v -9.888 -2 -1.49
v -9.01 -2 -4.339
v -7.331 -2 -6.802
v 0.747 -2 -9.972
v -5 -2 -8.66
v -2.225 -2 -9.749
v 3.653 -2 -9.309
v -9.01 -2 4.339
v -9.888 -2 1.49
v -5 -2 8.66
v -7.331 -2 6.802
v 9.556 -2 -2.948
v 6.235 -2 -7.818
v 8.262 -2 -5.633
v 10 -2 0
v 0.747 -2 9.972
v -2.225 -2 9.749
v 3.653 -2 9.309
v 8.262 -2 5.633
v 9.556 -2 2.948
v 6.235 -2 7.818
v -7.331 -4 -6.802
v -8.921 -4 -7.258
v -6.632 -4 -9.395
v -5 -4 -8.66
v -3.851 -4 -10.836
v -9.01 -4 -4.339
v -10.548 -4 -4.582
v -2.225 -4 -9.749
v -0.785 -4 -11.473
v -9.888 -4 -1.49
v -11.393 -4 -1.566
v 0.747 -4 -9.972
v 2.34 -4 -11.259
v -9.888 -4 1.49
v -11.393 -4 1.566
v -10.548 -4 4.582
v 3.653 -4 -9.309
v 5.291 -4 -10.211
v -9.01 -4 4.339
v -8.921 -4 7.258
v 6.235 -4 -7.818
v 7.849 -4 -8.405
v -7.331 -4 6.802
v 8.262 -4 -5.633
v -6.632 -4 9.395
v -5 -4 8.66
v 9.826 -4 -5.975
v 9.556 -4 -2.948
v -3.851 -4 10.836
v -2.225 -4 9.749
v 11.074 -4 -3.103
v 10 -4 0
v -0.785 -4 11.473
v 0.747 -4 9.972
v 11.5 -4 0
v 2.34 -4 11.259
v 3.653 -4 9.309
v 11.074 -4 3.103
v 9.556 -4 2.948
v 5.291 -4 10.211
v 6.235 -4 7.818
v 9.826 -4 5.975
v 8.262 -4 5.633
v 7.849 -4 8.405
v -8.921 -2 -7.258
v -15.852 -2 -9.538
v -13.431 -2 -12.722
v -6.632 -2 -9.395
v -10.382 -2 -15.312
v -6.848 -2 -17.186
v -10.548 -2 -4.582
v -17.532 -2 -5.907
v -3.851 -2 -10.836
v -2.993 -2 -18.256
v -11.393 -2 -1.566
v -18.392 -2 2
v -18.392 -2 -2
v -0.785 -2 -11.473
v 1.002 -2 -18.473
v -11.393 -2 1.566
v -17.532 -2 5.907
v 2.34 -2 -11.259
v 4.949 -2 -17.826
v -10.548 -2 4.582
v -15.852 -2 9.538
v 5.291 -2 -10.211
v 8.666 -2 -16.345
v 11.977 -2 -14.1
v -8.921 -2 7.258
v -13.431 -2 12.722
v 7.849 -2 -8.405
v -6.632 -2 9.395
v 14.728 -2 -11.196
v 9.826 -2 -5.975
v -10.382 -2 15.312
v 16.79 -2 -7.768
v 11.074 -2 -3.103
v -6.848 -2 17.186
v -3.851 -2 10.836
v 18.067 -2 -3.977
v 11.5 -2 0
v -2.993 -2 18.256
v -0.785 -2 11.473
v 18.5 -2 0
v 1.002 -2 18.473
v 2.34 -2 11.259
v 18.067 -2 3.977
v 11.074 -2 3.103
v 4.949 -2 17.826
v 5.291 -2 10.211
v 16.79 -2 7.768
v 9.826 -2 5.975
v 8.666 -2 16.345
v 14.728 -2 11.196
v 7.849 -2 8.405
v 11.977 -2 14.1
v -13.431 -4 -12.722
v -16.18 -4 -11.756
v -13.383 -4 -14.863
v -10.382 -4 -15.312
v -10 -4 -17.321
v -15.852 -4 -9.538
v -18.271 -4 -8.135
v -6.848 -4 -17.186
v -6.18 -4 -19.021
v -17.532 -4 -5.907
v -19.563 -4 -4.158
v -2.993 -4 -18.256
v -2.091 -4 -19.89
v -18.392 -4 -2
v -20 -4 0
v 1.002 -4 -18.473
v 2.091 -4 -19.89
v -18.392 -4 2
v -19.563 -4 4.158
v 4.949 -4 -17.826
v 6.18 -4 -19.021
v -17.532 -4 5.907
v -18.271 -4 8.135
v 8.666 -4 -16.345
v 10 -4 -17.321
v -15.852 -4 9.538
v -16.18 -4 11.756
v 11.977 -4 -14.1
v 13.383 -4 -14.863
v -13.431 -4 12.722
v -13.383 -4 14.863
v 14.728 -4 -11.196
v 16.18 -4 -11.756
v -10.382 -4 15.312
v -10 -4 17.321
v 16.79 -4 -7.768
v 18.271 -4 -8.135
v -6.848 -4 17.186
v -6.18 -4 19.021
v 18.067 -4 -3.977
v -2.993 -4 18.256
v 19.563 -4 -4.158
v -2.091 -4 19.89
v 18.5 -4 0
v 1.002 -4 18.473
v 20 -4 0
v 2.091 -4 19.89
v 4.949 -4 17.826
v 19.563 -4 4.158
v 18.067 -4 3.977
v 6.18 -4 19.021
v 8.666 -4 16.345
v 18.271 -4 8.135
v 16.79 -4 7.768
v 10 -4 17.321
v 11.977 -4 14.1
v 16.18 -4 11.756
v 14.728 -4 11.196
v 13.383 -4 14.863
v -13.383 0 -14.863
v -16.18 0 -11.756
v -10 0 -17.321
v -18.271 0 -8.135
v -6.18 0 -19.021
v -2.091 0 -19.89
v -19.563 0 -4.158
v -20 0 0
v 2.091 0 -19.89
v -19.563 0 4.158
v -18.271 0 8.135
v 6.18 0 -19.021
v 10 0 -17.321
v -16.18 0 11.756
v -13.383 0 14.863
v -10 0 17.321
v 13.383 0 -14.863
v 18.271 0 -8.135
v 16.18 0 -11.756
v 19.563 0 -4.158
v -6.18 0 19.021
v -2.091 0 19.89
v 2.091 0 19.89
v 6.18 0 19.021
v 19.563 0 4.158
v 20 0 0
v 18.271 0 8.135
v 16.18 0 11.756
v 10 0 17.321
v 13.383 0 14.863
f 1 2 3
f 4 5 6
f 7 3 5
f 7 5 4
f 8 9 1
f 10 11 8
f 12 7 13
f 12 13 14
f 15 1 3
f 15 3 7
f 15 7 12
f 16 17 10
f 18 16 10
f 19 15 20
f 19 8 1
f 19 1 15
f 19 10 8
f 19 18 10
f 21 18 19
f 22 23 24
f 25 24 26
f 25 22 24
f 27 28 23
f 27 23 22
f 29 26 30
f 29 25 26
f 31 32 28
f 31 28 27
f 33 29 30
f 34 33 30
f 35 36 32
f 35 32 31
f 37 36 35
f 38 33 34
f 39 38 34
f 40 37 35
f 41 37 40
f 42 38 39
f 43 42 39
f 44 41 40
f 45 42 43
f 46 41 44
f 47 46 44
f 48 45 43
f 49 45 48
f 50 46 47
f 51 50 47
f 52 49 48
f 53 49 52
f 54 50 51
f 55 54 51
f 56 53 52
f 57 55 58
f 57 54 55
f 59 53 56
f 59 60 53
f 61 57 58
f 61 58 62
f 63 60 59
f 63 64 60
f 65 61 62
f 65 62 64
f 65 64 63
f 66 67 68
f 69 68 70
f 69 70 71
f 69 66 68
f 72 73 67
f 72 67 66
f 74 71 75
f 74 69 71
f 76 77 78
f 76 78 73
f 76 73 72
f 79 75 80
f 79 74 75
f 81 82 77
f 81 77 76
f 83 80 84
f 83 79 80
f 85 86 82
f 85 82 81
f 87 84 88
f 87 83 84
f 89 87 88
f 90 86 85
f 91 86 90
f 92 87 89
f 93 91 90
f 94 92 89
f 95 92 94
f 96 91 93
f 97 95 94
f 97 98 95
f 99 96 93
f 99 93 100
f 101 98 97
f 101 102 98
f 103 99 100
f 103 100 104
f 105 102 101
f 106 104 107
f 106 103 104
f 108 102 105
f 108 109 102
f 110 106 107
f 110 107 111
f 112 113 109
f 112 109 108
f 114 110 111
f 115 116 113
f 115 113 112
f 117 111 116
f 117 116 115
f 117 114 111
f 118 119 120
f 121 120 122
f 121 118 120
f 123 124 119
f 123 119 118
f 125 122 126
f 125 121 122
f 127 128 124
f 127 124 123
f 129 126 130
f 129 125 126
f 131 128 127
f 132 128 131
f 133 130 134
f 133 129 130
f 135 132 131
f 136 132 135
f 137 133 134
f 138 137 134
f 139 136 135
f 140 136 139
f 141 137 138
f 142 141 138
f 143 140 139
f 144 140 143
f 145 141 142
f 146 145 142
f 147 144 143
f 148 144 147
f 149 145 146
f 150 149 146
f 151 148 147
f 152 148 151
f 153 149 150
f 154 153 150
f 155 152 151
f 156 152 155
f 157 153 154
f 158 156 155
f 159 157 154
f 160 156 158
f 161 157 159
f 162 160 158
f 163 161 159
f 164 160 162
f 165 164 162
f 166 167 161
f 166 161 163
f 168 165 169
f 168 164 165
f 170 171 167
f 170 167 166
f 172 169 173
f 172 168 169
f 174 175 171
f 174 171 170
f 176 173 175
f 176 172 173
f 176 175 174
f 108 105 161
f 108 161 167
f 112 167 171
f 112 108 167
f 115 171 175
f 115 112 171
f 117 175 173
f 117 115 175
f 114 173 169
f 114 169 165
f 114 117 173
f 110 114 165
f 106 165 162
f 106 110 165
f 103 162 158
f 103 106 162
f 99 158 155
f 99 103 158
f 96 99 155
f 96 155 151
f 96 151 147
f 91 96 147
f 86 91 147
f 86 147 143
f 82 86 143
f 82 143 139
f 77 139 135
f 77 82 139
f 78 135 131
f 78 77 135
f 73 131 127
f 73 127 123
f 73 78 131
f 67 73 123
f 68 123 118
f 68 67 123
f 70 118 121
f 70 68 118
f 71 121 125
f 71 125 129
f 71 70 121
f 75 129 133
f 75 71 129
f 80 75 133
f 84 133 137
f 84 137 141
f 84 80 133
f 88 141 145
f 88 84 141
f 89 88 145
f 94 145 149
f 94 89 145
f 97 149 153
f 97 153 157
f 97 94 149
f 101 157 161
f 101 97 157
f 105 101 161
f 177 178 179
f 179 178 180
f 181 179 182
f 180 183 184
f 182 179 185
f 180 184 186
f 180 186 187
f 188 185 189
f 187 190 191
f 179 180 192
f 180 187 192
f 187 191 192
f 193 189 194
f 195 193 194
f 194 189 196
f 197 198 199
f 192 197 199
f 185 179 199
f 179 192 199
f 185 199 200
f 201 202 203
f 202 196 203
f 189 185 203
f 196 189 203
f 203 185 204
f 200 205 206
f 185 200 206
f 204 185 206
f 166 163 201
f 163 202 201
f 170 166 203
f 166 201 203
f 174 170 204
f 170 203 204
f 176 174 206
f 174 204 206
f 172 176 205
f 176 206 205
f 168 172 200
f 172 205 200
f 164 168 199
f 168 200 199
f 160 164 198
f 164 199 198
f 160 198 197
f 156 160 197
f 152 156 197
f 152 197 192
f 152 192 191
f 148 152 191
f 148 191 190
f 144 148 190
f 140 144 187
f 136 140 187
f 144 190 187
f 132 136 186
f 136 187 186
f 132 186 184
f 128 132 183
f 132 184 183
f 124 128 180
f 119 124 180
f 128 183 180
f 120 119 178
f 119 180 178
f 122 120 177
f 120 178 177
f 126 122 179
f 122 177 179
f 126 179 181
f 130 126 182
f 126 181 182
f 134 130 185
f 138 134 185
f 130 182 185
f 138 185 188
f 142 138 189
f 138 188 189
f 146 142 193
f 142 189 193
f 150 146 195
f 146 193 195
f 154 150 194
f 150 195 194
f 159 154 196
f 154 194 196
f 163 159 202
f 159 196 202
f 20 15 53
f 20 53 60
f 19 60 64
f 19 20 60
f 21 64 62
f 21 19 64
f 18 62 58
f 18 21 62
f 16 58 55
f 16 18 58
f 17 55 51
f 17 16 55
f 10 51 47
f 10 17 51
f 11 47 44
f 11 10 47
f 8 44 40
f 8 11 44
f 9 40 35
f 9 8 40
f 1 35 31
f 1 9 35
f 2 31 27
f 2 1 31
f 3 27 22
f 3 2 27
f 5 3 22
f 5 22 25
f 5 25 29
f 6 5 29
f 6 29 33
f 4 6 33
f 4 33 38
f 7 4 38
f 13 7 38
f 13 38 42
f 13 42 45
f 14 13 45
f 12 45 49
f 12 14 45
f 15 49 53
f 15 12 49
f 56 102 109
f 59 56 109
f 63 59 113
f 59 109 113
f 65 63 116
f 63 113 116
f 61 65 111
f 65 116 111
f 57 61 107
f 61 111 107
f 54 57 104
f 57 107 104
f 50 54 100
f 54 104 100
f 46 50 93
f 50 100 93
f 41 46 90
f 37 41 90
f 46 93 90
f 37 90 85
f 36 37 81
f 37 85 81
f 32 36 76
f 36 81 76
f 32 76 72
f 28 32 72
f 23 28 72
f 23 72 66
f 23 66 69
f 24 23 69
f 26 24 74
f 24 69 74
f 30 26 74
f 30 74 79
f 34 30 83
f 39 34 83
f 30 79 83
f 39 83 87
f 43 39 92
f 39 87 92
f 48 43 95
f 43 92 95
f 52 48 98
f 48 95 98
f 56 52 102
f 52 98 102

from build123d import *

# Parameters (mm, degrees)
F0_R     = 20
F1_DEPTH = 2
F2_R     = 20
F2_R_2   = 18.5
F3_DEPTH = 2
F4_R     = 11.5
F4_R_2   = 10
F5_DEPTH = 2


with BuildPart() as f1:
    # F0 (on Front) → F1 (new body)
    with BuildSketch(Plane.XZ):
        Circle(F0_R)
    extrude(amount=F1_DEPTH)

    # F2 (on face) → F3 (join)
    with BuildSketch(Plane.XZ.offset(2)):
        Circle(F2_R)
        Circle(F2_R_2, mode=Mode.SUBTRACT)
    extrude(amount=F3_DEPTH)

    # F4 (on face) → F5 (join)
    with BuildSketch(Plane.XZ.offset(2)):
        Circle(F4_R)
        Circle(F4_R_2, mode=Mode.SUBTRACT)
    extrude(amount=F5_DEPTH)


solid = f1.part
